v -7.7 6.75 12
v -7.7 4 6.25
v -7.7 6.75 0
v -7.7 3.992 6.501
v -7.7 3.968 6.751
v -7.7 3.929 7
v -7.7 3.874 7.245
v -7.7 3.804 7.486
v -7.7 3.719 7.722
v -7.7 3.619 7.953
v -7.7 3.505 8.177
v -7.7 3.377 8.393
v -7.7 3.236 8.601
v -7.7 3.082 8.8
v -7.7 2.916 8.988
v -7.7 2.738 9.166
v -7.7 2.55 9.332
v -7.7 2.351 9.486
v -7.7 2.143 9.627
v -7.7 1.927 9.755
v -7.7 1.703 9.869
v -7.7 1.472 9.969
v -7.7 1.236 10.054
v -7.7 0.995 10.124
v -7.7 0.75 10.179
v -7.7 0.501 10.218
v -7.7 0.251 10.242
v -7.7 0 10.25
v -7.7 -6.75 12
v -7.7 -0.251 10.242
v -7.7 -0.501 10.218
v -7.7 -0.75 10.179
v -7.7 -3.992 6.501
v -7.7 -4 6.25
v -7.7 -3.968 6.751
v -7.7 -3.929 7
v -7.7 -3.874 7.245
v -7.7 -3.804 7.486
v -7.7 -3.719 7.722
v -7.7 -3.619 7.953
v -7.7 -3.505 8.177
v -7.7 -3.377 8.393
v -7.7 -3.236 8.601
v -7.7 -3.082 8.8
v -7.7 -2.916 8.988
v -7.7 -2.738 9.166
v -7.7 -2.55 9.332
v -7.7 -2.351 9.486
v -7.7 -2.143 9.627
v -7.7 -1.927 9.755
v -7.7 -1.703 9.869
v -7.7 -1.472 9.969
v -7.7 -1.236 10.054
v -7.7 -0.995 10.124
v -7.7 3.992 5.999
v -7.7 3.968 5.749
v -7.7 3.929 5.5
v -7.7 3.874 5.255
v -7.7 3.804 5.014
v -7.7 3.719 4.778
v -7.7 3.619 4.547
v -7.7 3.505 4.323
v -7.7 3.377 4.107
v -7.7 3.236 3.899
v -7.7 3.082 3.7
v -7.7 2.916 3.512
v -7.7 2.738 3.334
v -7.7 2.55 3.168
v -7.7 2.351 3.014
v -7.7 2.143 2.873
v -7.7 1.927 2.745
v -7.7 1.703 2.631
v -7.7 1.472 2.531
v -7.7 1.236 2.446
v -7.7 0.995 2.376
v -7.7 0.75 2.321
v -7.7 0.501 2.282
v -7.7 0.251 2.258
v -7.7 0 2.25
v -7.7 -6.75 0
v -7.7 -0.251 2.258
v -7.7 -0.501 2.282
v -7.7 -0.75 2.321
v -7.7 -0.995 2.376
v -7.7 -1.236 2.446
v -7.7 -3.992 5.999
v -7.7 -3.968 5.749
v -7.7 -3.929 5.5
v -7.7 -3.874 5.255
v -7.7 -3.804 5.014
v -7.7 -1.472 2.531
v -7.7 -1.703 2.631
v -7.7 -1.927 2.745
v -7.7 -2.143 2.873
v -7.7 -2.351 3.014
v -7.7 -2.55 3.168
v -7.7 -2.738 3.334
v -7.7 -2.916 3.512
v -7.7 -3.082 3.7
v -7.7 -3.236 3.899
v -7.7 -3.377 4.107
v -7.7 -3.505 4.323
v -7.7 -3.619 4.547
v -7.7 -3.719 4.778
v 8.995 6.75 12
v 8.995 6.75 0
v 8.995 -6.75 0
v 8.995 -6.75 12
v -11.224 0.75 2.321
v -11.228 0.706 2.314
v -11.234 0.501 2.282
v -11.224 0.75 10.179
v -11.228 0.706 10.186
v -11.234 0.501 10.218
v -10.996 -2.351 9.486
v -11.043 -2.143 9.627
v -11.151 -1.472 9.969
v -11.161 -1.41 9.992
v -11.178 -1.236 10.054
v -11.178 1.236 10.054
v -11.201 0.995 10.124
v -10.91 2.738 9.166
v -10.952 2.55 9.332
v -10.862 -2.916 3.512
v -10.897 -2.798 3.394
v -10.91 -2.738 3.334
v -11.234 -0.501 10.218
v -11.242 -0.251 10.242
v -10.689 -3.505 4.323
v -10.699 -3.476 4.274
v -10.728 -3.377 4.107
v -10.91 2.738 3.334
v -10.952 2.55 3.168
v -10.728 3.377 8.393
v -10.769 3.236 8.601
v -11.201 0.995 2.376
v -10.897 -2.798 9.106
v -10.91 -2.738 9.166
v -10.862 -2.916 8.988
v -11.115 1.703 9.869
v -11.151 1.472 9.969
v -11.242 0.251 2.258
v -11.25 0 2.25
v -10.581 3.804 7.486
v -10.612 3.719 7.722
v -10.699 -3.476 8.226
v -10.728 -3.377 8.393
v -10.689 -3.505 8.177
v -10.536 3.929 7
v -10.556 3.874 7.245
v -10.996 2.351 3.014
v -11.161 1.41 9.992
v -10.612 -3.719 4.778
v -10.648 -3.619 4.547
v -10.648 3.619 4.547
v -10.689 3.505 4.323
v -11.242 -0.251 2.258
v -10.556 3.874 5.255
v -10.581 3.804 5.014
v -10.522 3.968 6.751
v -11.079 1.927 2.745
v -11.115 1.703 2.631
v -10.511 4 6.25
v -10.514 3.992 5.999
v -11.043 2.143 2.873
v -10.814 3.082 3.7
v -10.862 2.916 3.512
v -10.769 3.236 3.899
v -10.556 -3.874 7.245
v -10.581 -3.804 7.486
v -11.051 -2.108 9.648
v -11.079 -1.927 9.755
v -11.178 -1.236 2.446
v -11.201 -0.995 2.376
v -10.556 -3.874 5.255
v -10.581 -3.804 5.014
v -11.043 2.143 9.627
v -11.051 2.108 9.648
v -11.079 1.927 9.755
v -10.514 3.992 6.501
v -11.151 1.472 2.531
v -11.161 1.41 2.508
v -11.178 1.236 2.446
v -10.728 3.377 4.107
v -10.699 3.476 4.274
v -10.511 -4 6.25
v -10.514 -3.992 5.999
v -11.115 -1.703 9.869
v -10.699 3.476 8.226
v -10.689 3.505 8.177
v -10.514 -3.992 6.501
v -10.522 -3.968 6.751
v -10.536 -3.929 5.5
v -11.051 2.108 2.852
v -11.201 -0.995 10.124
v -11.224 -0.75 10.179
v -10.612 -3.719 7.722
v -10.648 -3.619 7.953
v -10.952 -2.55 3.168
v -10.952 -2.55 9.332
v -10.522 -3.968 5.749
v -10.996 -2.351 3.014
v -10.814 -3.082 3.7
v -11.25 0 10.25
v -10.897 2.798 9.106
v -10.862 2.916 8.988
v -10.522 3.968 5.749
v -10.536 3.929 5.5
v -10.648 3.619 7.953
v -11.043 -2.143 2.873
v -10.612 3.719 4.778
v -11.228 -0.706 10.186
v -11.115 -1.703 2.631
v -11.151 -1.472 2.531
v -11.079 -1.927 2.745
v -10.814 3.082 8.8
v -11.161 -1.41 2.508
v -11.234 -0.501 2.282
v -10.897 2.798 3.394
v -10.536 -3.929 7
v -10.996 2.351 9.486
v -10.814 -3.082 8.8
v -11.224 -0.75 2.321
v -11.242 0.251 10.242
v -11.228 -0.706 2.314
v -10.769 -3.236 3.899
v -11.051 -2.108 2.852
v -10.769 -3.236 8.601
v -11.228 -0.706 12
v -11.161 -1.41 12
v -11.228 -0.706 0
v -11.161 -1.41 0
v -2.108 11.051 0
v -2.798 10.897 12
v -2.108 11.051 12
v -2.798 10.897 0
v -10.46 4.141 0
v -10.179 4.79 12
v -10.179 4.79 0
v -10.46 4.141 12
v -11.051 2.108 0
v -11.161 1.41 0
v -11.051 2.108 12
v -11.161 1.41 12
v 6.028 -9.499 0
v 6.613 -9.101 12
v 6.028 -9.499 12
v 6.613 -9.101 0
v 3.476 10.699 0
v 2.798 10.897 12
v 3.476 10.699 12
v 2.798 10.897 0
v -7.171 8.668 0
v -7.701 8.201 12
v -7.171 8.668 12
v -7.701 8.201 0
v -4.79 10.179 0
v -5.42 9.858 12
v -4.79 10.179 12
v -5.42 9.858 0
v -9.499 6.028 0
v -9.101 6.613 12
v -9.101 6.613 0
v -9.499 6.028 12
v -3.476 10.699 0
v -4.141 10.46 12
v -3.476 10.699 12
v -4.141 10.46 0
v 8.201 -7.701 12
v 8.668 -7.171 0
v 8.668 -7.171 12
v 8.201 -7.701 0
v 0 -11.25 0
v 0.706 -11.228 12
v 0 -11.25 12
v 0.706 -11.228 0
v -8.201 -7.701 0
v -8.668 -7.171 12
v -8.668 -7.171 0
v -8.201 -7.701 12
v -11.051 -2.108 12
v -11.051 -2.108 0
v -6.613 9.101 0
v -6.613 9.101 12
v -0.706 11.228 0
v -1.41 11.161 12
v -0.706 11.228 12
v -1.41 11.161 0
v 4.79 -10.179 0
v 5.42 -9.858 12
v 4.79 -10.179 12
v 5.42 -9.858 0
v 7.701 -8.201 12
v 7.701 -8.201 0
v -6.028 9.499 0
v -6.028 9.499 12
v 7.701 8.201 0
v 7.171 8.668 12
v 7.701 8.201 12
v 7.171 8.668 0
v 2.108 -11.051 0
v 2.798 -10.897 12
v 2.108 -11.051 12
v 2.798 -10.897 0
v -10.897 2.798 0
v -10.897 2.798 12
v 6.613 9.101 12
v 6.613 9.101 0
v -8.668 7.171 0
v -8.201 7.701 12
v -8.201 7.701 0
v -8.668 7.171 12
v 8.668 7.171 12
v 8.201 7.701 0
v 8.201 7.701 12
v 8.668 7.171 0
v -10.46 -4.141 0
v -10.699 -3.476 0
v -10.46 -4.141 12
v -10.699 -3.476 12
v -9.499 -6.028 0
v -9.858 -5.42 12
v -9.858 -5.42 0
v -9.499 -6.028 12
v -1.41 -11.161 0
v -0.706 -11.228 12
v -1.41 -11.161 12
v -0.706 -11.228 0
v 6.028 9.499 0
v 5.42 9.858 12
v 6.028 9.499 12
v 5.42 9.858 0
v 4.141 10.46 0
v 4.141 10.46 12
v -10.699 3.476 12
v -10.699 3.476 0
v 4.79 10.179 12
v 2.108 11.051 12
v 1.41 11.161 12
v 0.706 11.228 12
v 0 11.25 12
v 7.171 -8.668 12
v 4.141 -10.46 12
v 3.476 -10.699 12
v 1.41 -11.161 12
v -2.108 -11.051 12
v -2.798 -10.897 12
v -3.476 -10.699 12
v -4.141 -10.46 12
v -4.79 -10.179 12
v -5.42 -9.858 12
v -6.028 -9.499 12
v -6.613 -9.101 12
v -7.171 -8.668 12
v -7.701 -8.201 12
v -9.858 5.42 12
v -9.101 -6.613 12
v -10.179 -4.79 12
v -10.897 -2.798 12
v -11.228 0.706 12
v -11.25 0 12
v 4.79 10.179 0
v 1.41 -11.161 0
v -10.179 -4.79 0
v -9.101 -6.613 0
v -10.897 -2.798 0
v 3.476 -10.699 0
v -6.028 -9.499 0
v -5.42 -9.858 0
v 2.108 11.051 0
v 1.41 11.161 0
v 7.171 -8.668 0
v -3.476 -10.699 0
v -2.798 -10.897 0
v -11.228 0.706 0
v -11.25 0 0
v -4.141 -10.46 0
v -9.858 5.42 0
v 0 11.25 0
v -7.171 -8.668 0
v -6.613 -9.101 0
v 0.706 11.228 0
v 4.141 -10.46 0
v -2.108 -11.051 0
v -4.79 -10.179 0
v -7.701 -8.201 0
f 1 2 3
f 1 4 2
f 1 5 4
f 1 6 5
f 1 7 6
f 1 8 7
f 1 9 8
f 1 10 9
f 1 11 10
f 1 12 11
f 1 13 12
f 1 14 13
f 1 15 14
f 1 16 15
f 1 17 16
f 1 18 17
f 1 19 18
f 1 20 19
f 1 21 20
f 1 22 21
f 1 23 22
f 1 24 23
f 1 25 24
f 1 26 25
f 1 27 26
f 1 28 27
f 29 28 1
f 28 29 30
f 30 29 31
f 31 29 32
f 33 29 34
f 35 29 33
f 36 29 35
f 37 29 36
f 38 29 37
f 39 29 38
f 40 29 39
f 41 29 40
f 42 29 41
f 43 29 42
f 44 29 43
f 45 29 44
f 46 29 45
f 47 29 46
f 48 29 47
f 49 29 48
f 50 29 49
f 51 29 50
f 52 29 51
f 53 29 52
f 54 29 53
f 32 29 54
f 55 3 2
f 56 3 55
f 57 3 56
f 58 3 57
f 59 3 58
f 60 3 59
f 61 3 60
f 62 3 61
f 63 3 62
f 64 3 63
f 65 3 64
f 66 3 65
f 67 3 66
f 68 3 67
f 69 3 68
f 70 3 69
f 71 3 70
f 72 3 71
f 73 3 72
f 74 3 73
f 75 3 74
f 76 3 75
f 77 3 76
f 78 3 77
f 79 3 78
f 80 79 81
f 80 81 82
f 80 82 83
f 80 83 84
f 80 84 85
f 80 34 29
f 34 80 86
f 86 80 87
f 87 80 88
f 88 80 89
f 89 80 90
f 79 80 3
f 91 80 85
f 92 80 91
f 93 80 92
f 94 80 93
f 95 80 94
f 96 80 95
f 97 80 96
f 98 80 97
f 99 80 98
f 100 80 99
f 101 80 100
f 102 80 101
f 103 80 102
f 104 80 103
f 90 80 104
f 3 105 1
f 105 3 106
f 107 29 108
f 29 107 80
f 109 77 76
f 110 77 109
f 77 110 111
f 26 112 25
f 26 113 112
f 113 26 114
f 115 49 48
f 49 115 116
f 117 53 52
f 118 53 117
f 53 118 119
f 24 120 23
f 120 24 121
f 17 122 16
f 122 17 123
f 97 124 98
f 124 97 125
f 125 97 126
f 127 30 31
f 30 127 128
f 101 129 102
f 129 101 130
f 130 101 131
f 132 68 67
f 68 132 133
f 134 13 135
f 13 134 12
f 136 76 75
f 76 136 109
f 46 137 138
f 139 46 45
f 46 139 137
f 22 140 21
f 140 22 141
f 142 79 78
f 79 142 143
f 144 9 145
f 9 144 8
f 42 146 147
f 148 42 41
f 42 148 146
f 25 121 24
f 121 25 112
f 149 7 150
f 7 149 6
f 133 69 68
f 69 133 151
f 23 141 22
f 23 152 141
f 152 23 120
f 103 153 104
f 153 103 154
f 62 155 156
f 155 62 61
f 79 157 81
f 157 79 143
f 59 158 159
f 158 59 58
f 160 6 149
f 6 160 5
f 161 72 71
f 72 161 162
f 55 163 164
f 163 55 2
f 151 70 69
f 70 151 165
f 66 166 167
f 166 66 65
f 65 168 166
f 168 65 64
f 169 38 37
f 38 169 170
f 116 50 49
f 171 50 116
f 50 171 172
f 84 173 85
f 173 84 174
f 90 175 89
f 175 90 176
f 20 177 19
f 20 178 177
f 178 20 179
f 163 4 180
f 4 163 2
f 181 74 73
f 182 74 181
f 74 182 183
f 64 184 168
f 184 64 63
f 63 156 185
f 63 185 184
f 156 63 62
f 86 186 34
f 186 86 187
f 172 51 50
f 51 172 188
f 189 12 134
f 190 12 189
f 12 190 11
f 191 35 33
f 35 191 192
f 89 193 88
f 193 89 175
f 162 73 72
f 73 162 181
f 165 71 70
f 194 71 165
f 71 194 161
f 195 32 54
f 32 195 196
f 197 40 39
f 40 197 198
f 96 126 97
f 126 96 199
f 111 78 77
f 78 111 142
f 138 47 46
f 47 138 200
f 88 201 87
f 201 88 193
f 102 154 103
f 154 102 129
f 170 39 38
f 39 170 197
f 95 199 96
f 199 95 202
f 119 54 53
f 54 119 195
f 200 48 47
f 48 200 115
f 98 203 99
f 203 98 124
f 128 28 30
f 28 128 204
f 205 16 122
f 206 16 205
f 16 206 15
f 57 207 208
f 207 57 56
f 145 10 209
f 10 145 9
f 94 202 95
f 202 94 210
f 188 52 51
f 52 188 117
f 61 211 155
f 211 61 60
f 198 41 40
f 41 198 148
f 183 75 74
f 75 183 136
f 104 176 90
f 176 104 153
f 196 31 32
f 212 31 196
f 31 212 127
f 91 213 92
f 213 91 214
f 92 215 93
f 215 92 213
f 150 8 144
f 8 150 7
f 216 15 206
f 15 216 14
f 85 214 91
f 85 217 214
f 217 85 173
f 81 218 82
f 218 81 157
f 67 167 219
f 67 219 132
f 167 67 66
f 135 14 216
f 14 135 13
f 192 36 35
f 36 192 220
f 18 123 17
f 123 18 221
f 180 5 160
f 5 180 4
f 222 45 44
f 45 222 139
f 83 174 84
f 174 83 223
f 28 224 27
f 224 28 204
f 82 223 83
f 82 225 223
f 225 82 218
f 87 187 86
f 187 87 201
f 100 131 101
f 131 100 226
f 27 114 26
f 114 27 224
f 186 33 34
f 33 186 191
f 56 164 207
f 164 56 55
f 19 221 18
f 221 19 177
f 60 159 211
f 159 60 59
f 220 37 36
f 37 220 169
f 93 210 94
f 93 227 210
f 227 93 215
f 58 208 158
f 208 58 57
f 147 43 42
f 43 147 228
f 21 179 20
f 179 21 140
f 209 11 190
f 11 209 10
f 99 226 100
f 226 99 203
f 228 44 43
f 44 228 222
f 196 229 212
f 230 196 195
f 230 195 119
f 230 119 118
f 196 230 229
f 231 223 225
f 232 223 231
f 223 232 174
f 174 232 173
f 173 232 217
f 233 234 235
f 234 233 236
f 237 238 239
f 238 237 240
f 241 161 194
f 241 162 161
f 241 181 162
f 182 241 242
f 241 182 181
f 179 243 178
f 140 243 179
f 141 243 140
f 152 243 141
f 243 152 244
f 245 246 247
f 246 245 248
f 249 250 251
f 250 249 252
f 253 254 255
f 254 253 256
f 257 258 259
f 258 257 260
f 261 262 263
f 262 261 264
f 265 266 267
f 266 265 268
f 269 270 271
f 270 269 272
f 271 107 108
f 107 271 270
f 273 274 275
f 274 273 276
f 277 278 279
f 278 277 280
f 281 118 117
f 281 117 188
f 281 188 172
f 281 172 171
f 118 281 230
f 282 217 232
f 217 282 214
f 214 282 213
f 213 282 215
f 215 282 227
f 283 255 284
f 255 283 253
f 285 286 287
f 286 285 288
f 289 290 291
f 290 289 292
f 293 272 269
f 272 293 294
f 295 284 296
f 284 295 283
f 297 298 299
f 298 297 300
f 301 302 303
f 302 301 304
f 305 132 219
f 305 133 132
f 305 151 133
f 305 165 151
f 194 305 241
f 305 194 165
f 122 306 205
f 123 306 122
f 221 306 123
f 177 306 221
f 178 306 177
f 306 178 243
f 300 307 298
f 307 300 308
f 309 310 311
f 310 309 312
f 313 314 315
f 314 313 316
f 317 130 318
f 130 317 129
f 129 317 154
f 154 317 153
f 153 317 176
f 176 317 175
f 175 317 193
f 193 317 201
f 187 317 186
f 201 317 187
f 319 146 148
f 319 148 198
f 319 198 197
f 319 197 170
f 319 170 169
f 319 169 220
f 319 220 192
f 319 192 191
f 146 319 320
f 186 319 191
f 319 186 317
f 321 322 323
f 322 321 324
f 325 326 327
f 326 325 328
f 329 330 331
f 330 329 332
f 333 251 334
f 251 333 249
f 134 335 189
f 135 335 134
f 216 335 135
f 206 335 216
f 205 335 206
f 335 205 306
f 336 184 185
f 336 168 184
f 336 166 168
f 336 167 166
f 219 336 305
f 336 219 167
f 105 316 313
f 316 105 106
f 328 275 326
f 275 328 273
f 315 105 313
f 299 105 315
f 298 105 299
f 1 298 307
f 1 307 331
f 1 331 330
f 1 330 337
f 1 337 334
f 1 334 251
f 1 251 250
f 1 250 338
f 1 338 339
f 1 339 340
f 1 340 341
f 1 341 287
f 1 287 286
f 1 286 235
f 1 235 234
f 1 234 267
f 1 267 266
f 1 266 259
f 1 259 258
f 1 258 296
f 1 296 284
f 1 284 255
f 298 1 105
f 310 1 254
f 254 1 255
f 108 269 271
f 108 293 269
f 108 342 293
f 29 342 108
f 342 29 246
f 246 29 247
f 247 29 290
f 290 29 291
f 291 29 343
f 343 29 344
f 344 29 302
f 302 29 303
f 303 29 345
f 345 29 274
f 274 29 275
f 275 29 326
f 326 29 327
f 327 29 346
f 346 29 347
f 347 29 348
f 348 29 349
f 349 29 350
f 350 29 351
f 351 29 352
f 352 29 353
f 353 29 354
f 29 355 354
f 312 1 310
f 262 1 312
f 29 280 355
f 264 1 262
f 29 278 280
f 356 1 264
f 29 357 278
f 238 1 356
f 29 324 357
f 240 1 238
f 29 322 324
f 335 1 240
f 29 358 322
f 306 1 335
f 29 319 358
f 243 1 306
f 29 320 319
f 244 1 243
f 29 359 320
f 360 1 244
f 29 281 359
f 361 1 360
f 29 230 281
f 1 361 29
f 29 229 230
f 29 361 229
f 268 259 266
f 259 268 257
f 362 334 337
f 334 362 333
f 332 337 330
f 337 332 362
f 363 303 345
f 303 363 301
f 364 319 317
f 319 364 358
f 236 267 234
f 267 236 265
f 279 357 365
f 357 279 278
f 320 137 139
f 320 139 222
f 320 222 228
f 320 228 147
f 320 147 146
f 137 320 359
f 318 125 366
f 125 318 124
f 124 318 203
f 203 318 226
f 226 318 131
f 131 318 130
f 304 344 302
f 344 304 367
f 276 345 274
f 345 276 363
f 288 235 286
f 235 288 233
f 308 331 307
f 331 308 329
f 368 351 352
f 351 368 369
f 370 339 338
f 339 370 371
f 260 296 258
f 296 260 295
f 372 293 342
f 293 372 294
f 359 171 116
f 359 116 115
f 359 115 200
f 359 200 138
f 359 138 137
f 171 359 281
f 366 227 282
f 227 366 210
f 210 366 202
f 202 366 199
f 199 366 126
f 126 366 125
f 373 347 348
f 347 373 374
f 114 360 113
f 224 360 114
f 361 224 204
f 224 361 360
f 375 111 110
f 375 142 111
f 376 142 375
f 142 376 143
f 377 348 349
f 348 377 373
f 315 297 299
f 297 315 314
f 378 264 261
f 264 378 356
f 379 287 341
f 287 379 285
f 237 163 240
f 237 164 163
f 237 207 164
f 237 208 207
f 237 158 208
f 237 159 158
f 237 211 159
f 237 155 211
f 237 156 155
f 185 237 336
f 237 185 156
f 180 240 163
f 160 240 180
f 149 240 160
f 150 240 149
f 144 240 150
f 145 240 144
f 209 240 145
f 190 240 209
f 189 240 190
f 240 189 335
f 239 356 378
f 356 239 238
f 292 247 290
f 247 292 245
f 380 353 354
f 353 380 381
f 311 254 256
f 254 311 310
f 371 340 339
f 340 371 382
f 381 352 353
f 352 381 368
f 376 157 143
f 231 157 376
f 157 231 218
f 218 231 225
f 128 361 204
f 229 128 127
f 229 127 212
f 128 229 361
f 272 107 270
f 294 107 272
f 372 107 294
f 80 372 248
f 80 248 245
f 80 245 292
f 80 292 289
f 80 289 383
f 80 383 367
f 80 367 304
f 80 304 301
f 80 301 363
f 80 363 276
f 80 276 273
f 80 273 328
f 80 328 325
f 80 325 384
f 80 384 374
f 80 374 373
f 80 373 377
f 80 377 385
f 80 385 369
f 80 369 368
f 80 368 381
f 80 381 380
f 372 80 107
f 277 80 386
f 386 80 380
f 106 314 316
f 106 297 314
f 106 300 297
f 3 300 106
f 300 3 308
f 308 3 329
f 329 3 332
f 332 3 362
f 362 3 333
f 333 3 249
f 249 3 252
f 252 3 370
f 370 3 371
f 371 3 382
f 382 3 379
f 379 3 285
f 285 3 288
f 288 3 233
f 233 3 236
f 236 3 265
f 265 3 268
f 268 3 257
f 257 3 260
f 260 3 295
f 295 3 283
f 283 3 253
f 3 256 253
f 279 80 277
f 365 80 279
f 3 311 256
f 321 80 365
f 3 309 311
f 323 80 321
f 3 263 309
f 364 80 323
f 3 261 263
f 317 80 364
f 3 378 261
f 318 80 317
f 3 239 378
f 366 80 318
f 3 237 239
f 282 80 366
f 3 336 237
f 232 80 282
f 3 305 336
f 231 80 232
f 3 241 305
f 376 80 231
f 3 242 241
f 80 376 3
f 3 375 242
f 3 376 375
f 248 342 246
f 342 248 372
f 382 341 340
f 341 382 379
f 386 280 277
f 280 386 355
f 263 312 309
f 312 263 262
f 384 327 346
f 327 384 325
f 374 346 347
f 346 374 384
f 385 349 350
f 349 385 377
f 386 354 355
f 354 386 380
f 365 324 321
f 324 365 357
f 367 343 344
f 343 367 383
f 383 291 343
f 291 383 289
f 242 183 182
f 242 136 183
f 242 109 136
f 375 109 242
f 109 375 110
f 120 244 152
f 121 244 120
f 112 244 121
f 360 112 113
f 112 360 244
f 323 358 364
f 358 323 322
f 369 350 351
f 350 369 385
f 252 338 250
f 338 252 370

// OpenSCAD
difference(){
	union(){
        
       translate([0,0,0]){
            rotate(a = [0,0,0]) {
                cylinder(h=12, r=11.25, $fn=100, center=false);
            }
       }
	}
	union() {
        
       translate([-7.7,-13.5/2,-2]){
           cube([27,13.5,22.5], center=false);
       }
       translate([0,0,12.5/2]){
            rotate(a = [0,90,0]) {
                cylinder(h=600, r=4, $fn=100, center=true);
            }
       }			   

        
	}
}
